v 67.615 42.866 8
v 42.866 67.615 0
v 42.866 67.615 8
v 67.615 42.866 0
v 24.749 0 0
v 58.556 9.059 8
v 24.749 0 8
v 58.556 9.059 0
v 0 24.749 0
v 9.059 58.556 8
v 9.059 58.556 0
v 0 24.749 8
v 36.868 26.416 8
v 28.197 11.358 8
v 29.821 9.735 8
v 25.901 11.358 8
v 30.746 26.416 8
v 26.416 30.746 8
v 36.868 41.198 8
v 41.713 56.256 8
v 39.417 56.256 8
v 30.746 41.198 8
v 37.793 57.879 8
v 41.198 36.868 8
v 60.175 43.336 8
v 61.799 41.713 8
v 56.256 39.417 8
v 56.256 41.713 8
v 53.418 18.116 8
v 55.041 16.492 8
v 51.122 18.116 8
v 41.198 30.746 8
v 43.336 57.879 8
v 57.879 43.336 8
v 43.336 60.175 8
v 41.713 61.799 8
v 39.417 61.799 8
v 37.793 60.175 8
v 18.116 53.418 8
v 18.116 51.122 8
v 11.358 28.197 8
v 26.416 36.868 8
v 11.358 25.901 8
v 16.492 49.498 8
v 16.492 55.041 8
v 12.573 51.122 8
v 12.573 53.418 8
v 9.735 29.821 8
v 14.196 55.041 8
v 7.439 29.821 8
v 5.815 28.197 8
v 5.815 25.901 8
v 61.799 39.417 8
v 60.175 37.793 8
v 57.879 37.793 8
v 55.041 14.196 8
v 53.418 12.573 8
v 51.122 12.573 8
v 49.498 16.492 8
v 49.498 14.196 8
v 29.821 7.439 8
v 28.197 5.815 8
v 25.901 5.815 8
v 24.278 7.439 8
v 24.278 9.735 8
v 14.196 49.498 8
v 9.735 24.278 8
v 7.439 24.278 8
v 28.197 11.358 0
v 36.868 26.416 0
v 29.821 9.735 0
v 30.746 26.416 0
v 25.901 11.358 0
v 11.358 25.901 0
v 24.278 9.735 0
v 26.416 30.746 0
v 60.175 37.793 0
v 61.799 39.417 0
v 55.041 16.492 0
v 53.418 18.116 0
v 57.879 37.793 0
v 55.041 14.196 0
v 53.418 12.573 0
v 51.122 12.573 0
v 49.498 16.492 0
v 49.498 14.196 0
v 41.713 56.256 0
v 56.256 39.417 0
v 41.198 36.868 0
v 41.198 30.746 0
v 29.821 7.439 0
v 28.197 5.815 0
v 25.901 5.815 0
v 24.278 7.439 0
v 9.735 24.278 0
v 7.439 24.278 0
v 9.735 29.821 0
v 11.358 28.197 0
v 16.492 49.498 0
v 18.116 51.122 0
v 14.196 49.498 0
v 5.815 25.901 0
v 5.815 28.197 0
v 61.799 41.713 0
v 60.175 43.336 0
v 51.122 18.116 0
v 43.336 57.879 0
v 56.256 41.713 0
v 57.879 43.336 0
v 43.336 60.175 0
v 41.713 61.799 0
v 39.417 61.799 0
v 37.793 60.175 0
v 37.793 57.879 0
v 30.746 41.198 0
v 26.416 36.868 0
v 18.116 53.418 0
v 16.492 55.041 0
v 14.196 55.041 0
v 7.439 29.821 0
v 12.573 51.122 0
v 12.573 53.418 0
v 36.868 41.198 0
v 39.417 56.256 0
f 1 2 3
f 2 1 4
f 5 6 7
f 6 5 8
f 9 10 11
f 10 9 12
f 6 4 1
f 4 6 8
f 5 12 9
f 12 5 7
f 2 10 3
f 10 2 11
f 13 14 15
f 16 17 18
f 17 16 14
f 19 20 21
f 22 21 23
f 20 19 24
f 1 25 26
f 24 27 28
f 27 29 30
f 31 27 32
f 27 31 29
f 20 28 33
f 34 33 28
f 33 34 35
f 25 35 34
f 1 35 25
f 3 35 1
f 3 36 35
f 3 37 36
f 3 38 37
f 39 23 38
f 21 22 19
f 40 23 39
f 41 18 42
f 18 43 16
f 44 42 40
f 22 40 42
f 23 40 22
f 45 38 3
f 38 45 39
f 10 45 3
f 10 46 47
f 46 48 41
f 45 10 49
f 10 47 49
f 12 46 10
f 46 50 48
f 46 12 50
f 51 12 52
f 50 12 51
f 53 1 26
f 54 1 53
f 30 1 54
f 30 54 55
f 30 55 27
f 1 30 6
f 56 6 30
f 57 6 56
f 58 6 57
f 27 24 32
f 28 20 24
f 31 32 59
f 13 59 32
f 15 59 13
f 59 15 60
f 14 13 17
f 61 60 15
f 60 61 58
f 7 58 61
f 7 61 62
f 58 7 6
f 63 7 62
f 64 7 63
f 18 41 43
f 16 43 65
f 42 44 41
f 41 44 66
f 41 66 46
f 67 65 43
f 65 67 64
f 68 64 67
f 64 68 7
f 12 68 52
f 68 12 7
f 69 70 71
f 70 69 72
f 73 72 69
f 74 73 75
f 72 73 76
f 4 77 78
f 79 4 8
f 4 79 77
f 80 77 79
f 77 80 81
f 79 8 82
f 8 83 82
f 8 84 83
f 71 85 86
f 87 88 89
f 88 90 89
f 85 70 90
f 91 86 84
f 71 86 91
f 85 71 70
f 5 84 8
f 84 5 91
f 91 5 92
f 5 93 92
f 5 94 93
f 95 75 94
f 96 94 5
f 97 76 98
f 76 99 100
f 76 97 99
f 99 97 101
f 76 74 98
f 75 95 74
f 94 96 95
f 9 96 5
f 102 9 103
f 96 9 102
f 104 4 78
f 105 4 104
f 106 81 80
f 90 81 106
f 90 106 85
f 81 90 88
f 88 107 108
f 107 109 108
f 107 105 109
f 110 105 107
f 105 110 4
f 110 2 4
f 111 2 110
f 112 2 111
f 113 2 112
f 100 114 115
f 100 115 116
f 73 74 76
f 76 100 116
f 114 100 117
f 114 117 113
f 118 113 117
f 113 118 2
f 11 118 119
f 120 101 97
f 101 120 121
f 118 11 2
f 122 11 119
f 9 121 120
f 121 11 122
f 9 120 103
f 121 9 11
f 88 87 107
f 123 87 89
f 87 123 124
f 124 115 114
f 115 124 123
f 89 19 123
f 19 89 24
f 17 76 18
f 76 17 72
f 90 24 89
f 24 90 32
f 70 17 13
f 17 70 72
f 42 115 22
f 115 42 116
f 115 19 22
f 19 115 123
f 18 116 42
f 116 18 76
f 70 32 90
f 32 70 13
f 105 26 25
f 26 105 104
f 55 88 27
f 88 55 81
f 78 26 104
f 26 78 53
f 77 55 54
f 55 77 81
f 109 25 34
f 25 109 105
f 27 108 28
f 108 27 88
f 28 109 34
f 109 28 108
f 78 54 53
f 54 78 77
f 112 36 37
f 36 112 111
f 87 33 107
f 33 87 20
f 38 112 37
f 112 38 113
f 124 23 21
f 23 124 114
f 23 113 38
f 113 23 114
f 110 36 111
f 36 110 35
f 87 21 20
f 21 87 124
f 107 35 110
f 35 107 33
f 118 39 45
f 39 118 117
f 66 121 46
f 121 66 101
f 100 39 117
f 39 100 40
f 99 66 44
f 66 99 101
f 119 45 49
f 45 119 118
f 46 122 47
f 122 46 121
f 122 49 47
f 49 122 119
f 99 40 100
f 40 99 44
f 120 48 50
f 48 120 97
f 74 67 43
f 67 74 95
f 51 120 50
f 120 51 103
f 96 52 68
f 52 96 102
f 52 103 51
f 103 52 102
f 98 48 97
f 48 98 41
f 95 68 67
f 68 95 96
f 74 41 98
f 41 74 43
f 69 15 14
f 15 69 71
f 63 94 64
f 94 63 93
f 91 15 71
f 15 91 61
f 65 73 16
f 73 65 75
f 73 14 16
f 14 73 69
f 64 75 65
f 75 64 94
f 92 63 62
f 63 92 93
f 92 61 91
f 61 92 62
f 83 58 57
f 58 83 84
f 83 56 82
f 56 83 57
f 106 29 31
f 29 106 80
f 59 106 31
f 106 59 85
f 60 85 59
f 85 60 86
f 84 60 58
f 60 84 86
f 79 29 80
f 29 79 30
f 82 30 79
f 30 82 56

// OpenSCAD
$fn = 32;

// ----------------------------------------------------------------------
// Polygon plate: 6-gon R35, 6 bolt windows
// ----------------------------------------------------------------------

// --- parameters (mm) ---
sides = 6;                // number of polygon sides
plate_r = 35;             // circumscribed radius of the polygon
bore_r = 8;               // centre bore radius
bolts = 6;                // number of bolt windows
ring_r = 26.11;           // bolt-circle radius
bolt_r = 3;               // bolt window radius
plate_t = 8;              // plate thickness, Z (extrusion height)

plate_d = 2 * plate_r;  // circumscribed diameter
bore_d = 2 * bore_r;  // centre bore diameter
bolt_d = 2 * bolt_r;  // bolt window diameter
ring_d = 2 * ring_r;  // bolt-circle diameter

profile = [[67.615, 42.866], [42.866, 67.615], [9.059, 58.556], [0, 24.749], [24.749, 0], [58.556, 9.059]];  // primary outline, 6 points, counter clockwise
void_1 = [[41.198, 36.868], [36.868, 41.198], [30.746, 41.198], [26.416, 36.868], [26.416, 30.746], [30.746, 26.416], [36.868, 26.416], [41.198, 30.746]];  // centre bore, 8 points
void_2 = [[61.799, 41.713], [60.175, 43.336], [57.879, 43.336], [56.256, 41.713], [56.256, 39.417], [57.879, 37.793], [60.175, 37.793], [61.799, 39.417]];  // bolt window 1, 8 points
void_3 = [[43.336, 60.175], [41.713, 61.799], [39.417, 61.799], [37.793, 60.175], [37.793, 57.879], [39.417, 56.256], [41.713, 56.256], [43.336, 57.879]];  // bolt window 2, 8 points
void_4 = [[18.116, 53.418], [16.492, 55.041], [14.196, 55.041], [12.573, 53.418], [12.573, 51.122], [14.196, 49.498], [16.492, 49.498], [18.116, 51.122]];  // bolt window 3, 8 points
void_5 = [[11.358, 28.197], [9.735, 29.821], [7.439, 29.821], [5.815, 28.197], [5.815, 25.901], [7.439, 24.278], [9.735, 24.278], [11.358, 25.901]];  // bolt window 4, 8 points
void_6 = [[29.821, 9.735], [28.197, 11.358], [25.901, 11.358], [24.278, 9.735], [24.278, 7.439], [25.901, 5.815], [28.197, 5.815], [29.821, 7.439]];  // bolt window 5, 8 points
void_7 = [[55.041, 16.492], [53.418, 18.116], [51.122, 18.116], [49.498, 16.492], [49.498, 14.196], [51.122, 12.573], [53.418, 12.573], [55.041, 14.196]];  // bolt window 6, 8 points

// --- the one profile operation ---
difference() {
  linear_extrude(height = plate_t) polygon(points = profile);
  translate([0, 0, -1])
    linear_extrude(height = plate_t + 2) polygon(points = void_1);
  translate([0, 0, -1])
    linear_extrude(height = plate_t + 2) polygon(points = void_2);
  translate([0, 0, -1])
    linear_extrude(height = plate_t + 2) polygon(points = void_3);
  translate([0, 0, -1])
    linear_extrude(height = plate_t + 2) polygon(points = void_4);
  translate([0, 0, -1])
    linear_extrude(height = plate_t + 2) polygon(points = void_5);
  translate([0, 0, -1])
    linear_extrude(height = plate_t + 2) polygon(points = void_6);
  translate([0, 0, -1])
    linear_extrude(height = plate_t + 2) polygon(points = void_7);
}
